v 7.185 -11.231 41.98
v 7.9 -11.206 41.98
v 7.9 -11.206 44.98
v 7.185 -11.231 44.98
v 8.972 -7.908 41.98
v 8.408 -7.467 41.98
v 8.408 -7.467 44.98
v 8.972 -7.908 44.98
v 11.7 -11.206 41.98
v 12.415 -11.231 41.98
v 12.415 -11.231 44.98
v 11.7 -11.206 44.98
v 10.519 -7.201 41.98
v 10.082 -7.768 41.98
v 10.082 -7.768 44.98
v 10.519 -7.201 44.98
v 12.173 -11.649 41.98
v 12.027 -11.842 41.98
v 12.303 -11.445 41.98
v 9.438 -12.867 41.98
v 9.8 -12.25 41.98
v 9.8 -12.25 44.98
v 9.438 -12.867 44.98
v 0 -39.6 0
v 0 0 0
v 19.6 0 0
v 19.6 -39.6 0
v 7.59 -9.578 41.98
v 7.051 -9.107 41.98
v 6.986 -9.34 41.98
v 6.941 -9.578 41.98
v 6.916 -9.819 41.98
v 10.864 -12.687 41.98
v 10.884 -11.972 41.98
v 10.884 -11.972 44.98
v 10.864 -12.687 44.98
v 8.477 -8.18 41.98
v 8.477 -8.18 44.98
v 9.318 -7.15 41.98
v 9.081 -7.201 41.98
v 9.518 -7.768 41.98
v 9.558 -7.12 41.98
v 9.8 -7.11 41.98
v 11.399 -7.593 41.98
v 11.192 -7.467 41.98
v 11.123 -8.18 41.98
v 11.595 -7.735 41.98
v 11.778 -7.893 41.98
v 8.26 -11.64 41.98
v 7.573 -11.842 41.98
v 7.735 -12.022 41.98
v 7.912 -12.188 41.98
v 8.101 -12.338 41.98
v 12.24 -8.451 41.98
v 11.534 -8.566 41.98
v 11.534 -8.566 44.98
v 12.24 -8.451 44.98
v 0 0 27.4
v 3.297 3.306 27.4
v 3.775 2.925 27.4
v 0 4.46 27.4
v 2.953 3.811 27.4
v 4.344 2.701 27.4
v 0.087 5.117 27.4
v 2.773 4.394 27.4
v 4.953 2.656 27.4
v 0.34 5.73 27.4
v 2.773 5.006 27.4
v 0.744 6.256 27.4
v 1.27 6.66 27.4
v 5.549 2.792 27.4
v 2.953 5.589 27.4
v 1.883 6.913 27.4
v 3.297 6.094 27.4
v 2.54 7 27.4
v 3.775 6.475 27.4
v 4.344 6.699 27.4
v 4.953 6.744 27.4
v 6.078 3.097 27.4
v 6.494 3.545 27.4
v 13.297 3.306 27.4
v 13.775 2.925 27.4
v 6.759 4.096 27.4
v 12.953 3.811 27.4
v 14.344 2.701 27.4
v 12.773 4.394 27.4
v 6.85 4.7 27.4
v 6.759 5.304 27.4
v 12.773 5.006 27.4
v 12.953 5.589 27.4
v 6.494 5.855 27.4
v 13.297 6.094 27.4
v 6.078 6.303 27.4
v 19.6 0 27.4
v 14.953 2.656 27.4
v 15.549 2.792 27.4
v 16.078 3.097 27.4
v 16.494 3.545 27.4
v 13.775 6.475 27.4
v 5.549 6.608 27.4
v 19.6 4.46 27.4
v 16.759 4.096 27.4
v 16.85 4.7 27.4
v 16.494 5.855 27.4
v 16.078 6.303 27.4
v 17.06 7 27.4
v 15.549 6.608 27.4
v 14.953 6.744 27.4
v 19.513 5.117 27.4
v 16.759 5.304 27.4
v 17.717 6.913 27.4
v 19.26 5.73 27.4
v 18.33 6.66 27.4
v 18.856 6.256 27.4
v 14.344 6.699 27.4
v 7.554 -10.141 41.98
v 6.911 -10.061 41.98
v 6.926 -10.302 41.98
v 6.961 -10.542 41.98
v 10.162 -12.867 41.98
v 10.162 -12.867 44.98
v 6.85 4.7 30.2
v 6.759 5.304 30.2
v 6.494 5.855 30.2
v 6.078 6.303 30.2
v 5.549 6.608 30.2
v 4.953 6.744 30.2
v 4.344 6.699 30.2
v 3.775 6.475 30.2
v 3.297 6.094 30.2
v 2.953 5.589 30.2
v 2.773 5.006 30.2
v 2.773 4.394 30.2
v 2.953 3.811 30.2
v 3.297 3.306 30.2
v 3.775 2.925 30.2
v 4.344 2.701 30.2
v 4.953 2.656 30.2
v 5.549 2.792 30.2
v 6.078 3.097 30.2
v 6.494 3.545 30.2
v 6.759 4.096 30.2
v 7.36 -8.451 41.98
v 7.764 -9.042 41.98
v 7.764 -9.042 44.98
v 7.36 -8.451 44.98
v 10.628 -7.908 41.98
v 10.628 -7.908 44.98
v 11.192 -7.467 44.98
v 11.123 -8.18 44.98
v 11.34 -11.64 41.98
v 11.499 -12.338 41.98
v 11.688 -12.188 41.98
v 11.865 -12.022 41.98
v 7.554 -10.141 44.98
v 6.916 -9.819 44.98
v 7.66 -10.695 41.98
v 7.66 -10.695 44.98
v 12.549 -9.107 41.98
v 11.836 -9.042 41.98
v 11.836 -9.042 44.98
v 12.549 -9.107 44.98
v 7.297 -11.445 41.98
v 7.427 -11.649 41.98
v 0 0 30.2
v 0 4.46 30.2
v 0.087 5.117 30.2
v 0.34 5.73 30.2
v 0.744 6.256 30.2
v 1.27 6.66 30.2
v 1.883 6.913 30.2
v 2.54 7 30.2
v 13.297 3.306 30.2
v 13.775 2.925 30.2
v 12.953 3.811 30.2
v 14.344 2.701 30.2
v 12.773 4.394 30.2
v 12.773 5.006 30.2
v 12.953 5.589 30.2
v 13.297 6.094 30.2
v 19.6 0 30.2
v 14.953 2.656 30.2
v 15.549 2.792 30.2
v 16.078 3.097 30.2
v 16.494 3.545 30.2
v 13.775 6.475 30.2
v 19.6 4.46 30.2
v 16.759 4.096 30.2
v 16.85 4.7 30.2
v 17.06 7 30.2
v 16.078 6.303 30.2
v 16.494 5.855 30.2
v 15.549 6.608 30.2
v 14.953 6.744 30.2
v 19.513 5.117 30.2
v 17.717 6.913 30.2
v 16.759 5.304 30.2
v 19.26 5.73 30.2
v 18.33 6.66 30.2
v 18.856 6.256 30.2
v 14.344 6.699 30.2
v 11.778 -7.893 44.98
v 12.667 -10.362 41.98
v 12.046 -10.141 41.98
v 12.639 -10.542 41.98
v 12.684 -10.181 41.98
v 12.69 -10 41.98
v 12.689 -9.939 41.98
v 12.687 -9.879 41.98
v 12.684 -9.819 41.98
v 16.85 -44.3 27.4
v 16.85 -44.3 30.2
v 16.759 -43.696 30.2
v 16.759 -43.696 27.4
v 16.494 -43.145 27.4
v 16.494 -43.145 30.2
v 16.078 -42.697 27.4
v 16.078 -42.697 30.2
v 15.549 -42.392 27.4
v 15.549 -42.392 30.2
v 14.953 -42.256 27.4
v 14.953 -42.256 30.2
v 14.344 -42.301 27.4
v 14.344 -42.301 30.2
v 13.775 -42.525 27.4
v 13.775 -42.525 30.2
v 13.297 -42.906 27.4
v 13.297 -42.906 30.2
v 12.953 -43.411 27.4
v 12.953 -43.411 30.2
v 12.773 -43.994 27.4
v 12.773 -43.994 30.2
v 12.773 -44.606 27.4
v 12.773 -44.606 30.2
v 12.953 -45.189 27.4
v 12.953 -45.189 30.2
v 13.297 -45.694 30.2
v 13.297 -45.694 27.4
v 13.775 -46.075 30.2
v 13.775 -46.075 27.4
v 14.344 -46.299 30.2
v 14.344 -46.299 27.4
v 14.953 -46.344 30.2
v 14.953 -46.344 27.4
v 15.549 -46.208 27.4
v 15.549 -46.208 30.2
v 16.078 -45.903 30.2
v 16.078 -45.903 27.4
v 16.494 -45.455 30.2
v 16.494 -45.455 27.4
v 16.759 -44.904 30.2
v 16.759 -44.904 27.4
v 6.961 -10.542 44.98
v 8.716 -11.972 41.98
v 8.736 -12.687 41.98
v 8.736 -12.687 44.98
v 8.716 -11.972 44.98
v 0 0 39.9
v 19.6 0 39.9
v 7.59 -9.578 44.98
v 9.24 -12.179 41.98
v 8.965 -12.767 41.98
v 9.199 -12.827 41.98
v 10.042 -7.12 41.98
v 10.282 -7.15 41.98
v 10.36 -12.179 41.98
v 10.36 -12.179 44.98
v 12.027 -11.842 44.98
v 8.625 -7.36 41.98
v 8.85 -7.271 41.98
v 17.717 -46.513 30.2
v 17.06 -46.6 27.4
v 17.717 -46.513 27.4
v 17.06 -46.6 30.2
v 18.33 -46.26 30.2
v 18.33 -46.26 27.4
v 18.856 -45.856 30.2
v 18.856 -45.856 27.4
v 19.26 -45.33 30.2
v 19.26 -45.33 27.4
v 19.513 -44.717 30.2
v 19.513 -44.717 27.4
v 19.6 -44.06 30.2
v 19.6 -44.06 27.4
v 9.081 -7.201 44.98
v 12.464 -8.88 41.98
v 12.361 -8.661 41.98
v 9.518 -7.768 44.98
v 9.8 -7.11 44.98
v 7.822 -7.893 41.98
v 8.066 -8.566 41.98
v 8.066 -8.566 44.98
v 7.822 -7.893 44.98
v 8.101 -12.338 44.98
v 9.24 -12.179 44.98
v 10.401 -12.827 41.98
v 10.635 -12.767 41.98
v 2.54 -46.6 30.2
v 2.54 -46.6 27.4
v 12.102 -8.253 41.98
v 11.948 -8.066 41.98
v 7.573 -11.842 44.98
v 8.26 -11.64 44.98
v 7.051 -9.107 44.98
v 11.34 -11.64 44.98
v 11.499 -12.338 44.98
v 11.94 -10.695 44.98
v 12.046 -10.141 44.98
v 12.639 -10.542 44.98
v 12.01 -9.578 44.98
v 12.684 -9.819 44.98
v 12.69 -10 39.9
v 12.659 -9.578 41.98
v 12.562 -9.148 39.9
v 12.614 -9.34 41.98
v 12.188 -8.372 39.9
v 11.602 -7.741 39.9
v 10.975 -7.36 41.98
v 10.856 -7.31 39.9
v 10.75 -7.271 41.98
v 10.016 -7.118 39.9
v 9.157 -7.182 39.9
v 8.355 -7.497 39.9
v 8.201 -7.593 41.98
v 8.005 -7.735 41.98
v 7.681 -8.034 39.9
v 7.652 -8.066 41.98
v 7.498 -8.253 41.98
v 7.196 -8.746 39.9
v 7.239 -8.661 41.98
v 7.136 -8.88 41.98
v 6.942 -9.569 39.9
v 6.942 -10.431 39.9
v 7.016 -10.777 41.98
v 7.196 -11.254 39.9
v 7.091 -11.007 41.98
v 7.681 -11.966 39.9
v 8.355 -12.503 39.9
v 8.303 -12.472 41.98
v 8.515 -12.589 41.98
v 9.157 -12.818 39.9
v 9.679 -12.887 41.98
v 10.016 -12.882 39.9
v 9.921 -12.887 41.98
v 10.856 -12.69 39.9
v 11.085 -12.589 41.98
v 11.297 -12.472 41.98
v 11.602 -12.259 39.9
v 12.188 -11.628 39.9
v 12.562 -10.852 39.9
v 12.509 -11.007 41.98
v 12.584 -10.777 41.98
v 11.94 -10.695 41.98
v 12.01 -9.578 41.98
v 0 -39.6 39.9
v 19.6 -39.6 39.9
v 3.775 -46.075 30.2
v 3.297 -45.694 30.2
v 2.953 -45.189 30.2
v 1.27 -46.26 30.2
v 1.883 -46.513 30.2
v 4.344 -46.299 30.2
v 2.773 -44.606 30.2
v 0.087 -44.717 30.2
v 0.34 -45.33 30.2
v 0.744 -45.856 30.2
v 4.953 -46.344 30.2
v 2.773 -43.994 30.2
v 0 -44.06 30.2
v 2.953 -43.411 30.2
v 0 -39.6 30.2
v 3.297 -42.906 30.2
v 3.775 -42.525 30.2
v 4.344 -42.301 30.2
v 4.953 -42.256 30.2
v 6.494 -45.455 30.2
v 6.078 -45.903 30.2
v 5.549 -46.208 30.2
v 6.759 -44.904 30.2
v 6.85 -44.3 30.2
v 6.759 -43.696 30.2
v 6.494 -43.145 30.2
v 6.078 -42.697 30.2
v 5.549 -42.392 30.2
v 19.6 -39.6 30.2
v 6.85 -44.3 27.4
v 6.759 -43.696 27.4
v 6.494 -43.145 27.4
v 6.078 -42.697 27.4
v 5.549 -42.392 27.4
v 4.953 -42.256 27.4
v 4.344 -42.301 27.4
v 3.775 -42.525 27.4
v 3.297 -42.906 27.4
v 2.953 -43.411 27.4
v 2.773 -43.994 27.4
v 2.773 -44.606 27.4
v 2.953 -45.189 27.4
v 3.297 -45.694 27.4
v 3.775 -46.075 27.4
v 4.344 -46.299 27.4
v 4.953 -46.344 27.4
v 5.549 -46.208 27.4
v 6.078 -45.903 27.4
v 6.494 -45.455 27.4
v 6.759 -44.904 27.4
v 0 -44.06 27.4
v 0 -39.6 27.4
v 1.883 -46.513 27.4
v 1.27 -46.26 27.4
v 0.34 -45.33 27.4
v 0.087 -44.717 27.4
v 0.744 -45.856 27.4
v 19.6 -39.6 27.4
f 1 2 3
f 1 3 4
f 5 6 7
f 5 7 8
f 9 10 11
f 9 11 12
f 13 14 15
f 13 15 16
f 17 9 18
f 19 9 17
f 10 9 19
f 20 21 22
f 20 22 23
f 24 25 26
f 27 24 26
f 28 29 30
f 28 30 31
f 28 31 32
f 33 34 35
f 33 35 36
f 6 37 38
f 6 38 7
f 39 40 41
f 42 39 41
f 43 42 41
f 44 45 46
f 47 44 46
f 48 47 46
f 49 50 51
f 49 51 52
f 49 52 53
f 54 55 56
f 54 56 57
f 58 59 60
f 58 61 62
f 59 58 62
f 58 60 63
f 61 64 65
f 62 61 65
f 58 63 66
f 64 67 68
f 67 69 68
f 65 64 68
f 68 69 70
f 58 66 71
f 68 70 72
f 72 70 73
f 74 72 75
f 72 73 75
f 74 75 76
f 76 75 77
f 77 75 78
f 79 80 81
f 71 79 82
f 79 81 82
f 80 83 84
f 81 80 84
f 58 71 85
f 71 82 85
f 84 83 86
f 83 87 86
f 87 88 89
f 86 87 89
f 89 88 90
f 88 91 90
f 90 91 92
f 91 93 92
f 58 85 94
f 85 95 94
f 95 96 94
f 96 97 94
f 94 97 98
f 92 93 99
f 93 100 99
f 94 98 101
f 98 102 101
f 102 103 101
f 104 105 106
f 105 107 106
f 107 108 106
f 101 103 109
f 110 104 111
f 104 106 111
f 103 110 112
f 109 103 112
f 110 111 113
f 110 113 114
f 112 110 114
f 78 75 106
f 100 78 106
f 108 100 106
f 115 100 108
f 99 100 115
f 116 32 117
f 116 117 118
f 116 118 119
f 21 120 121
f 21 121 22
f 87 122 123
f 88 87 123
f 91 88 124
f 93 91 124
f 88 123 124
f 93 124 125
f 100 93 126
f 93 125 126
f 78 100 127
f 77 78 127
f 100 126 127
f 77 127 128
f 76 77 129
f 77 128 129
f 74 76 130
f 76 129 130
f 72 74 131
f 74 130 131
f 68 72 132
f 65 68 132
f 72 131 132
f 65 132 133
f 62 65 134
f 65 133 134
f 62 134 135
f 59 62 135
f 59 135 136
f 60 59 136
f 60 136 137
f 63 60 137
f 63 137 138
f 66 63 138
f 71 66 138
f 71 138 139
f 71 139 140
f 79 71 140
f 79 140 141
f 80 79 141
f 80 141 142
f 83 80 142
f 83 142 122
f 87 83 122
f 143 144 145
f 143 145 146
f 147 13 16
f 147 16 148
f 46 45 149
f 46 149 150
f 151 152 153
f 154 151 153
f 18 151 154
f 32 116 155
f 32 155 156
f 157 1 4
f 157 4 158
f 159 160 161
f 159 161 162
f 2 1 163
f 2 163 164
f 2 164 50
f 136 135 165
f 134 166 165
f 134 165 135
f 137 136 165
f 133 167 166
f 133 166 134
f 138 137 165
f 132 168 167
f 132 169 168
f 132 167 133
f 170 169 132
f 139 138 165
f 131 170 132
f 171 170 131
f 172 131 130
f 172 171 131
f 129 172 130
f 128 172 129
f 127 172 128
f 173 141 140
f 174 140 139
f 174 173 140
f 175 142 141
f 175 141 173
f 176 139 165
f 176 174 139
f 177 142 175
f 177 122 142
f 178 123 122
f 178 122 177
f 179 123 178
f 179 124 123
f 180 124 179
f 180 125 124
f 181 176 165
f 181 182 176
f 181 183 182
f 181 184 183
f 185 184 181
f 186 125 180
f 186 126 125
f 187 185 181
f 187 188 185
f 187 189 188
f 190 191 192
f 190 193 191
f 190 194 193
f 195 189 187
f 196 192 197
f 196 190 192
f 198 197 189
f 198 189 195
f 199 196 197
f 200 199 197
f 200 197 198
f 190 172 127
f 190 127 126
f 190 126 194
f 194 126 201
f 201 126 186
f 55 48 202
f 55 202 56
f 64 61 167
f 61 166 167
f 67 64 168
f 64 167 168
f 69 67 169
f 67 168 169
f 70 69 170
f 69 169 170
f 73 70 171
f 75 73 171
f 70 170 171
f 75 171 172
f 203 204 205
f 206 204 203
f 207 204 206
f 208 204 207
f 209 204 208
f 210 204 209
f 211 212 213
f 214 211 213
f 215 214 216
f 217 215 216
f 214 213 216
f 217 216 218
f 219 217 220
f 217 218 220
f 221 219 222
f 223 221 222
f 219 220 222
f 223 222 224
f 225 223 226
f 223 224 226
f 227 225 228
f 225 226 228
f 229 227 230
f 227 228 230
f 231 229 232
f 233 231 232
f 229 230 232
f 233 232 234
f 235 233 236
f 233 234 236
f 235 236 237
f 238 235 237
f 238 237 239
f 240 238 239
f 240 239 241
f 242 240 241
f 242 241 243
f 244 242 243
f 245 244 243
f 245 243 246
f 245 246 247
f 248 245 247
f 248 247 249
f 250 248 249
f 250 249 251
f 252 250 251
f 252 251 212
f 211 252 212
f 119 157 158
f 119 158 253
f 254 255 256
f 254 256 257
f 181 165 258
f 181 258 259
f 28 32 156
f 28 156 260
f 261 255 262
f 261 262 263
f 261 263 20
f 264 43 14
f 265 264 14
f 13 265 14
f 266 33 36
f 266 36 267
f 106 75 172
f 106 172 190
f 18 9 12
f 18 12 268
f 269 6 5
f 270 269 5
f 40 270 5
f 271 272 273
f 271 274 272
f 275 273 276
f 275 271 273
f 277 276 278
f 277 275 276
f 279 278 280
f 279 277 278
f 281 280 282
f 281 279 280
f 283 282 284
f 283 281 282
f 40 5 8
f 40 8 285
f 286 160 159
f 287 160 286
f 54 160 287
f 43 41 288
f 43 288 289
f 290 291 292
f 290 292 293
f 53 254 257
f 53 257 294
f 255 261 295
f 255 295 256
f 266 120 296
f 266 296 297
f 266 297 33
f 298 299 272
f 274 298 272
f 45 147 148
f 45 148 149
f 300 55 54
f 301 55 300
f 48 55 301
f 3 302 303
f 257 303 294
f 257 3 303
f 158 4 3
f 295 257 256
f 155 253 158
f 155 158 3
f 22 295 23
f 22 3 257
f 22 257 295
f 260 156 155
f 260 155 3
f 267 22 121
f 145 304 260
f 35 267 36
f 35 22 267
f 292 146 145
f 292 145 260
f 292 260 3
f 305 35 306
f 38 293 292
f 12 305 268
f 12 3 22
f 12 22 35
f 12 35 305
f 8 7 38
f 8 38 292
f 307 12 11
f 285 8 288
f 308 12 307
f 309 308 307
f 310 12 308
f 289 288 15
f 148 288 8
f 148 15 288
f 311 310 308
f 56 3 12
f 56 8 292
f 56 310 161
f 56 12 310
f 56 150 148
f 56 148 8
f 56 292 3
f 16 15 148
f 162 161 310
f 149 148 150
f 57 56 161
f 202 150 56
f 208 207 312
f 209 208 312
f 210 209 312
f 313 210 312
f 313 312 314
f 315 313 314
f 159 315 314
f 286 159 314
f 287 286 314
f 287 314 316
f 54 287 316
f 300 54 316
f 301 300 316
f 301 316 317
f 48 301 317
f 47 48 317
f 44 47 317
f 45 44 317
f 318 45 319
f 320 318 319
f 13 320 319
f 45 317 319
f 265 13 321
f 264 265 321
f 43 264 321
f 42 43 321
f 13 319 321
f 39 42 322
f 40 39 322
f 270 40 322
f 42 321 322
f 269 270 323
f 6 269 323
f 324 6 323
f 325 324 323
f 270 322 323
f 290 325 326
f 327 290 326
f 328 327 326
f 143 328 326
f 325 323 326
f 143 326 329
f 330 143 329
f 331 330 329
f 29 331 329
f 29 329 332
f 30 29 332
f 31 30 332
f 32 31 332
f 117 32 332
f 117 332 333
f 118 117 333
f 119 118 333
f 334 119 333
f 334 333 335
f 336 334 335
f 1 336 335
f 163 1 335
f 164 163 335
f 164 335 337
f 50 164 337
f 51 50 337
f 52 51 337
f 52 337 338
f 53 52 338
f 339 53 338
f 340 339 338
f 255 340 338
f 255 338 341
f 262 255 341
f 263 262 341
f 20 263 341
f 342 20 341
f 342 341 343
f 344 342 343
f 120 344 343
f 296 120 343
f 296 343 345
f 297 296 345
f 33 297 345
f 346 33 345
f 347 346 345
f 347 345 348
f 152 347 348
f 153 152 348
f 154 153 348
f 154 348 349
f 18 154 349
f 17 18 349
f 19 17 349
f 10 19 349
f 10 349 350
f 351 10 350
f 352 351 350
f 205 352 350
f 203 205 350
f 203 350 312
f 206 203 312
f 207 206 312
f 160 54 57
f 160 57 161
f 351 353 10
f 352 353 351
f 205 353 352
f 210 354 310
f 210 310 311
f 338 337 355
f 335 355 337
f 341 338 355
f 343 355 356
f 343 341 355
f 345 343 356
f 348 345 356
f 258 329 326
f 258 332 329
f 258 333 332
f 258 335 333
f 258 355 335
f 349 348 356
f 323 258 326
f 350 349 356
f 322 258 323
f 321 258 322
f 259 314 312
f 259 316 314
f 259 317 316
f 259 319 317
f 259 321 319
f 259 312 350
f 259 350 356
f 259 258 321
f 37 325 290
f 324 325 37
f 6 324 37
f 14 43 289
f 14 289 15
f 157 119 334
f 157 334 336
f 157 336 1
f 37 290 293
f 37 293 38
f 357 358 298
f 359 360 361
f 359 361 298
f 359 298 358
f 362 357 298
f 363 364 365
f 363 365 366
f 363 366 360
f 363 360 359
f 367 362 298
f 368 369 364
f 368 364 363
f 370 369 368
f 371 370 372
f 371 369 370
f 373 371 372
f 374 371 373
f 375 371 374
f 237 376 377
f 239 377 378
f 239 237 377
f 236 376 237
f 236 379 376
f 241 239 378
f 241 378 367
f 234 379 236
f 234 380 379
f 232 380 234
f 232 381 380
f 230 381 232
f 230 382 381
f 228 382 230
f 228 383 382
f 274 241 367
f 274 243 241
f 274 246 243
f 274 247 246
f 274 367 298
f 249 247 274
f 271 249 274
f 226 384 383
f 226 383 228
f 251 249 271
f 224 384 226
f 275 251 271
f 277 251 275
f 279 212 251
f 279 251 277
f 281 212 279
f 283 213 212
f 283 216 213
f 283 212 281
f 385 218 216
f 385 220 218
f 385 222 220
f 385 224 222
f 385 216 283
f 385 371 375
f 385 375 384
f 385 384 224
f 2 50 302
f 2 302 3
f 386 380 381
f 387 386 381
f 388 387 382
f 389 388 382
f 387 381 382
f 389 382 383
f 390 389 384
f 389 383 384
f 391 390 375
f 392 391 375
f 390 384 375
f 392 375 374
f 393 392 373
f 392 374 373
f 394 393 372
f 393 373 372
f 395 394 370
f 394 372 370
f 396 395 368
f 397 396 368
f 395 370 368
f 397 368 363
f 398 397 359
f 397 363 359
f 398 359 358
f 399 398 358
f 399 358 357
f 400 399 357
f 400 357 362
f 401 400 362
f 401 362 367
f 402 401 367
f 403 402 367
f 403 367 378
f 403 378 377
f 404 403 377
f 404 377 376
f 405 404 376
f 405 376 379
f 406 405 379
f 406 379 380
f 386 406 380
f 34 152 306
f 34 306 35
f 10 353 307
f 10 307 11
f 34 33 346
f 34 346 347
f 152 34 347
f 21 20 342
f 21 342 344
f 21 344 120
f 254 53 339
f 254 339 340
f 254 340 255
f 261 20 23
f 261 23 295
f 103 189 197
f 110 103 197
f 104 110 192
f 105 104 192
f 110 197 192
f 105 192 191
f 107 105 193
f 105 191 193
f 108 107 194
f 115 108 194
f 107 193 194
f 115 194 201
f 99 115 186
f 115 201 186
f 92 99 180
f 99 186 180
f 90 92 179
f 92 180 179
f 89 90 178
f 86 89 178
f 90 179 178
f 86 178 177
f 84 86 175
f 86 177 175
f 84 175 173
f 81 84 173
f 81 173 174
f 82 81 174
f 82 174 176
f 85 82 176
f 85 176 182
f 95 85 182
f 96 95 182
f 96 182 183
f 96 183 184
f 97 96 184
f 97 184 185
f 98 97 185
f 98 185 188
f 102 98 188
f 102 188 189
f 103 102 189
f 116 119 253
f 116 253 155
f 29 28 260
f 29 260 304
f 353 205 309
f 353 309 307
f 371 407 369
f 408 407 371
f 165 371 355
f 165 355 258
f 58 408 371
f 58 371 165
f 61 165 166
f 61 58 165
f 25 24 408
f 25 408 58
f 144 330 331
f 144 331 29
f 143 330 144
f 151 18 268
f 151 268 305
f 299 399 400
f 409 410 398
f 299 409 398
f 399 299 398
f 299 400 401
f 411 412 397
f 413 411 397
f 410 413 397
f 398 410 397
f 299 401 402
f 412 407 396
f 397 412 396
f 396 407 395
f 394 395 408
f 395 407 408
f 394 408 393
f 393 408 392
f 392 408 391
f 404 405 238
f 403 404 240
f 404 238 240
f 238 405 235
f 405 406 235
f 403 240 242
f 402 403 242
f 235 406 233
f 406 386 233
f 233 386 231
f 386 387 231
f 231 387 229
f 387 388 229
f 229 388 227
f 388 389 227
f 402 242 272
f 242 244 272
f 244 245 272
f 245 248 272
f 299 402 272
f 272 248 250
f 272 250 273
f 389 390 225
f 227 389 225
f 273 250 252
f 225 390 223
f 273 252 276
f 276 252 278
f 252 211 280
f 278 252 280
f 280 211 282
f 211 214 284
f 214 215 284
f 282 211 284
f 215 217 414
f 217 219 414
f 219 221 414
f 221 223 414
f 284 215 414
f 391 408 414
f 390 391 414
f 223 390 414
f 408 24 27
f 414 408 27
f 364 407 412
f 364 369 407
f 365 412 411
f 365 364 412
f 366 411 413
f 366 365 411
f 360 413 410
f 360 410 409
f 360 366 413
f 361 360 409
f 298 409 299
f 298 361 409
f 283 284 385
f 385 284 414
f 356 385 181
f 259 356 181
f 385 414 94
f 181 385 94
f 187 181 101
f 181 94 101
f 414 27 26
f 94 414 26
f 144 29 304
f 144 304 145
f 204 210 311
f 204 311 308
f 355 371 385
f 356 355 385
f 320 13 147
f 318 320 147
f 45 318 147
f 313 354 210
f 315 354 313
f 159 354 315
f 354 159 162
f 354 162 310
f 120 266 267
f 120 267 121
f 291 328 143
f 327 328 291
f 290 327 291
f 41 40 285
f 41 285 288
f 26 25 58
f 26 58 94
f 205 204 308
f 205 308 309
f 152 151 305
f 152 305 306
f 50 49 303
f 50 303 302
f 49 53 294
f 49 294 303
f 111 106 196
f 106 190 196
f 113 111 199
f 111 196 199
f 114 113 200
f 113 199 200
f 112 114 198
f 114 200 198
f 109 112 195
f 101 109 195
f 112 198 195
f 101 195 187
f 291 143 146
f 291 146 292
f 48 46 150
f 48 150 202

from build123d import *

# Parameters (mm, degrees)
SKETCH1_W           = 19.6
SKETCH1_H           = 39.6
BOSS_EXTRUDE1_DEPTH = 39.9
SKETCH2_R           = 2.89
BOSS_EXTRUDE2_DEPTH = 5.08
SKETCH3_W           = 19.6
SKETCH3_H           = 53.6
BOSS_EXTRUDE3_DEPTH = 2.8
SKETCH4_R           = 2.05
CUT_EXTRUDE1_DEPTH  = 59.887689748
FILLET1_R           = 2.54
CUT_EXTRUDE3_START  = -3
CUT_EXTRUDE3_DEPTH  = 3


with BuildPart() as part:
    # Sketch1 → Boss-Extrude1 (new body)
    with BuildSketch(Plane.XY):
        with Locations((9.8, -19.8)):
            Rectangle(SKETCH1_W, SKETCH1_H)
    extrude(amount=BOSS_EXTRUDE1_DEPTH)

    # Sketch2 → Boss-Extrude2 (add)
    with BuildSketch(Plane.XY.offset(39.9)):
        with Locations((9.8, -10)):
            Circle(SKETCH2_R)
    extrude(amount=BOSS_EXTRUDE2_DEPTH)

    # Sketch3 → Boss-Extrude3 (add)
    with BuildSketch(Plane.XY.offset(27.400000064)):
        with Locations((9.8, -19.8)):
            Rectangle(SKETCH3_W, SKETCH3_H)
    extrude(amount=BOSS_EXTRUDE3_DEPTH)

    # Sketch4 → Cut-Extrude1 (cut, through all)
    with BuildSketch(Plane.XY.offset(30.200000064)):
        with Locations((4.8, 4.7)):
            Circle(SKETCH4_R)
        with Locations((14.8, 4.7)):
            Circle(SKETCH4_R)
        with Locations((4.8, -44.3)):
            Circle(SKETCH4_R)
        with Locations((14.8, -44.3)):
            Circle(SKETCH4_R)
    extrude(amount=-CUT_EXTRUDE1_DEPTH, mode=Mode.SUBTRACT)

    # Fillet1
    fillet1_edges = [part.edges().sort_by_distance(p)[0] for p in [
        (19.6, -46.6, 28.800000064),
        (0, 7, 28.800000064),
        (0, -46.6, 28.800000064),
        (19.6, 7, 28.800000064),
    ]]
    fillet(fillet1_edges, radius=FILLET1_R)

    # Sketch5 → Cut-Extrude3 (cut)
    with BuildSketch(Plane.XY.offset(44.98).offset(CUT_EXTRUDE3_START)):
        with BuildLine():
            ThreePointArc((10.518713774, -7.200794664), (10.162213045, -7.132788513), (9.8, -7.11))
            Line((9.8, -7.11), (10.081999776, -7.767741922))
            Line((10.081999776, -7.767741922), (10.518713774, -7.200794664))
        make_face()
        with BuildLine():
            Line((9.518000224, -7.767741922), (9.8, -7.11))
            ThreePointArc((9.8, -7.11), (9.437786955, -7.132788513), (9.081286226, -7.200794664))
            Line((9.081286226, -7.200794664), (9.518000224, -7.767741922))
        make_face()
        with BuildLine():
            Line((8.971719756, -7.908002907), (9.081286226, -7.200794664))
            ThreePointArc((9.081286226, -7.200794664), (8.736120043, -7.312945956), (8.407731882, -7.467473695))
            Line((8.407731882, -7.467473695), (8.971719756, -7.908002907))
        make_face()
        with BuildLine():
            Line((8.477483182, -8.179711763), (8.407731882, -7.467473695))
            ThreePointArc((8.407731882, -7.467473695), (8.101300621, -7.661940886), (7.821658864, -7.893280667))
            Line((7.821658864, -7.893280667), (8.477483182, -8.179711763))
        make_face()
        with BuildLine():
            Line((8.066345204, -8.565796023), (7.821658864, -7.893280667))
            ThreePointArc((7.821658864, -7.893280667), (7.573216728, -8.15784467), (7.359892295, -8.451460563))
            Line((7.359892295, -8.451460563), (8.066345204, -8.565796023))
        make_face()
        with BuildLine():
            Line((7.764139132, -9.041996594), (7.359892295, -8.451460563))
            ThreePointArc((7.359892295, -8.451460563), (7.185049818, -8.769497847), (7.051446668, -9.106940886))
            Line((7.051446668, -9.106940886), (7.764139132, -9.041996594))
        make_face()
        with BuildLine():
            Line((7.589853686, -9.578392042), (7.051446668, -9.106940886))
            ThreePointArc((7.051446668, -9.106940886), (6.961189845, -9.458468001), (6.915702755, -9.818535399))
            Line((6.915702755, -9.818535399), (7.589853686, -9.578392042))
        make_face()
        with BuildLine():
            Line((7.554439861, -10.141278669), (6.915702755, -9.818535399))
            ThreePointArc((6.915702755, -9.818535399), (6.915702755, -10.181464601), (6.961189845, -10.541531999))
            Line((6.961189845, -10.541531999), (7.554439861, -10.141278669))
        make_face()
        with BuildLine():
            Line((7.660122838, -10.695288237), (6.961189845, -10.541531999))
            ThreePointArc((6.961189845, -10.541531999), (7.051446668, -10.893059114), (7.185049818, -11.230502153))
            Line((7.185049818, -11.230502153), (7.660122838, -10.695288237))
        make_face()
        with BuildLine():
            ThreePointArc((11.778341136, -7.893280667), (11.498699379, -7.661940886), (11.192268118, -7.467473695))
            Line((11.192268118, -7.467473695), (11.122516818, -8.179711763))
            Line((11.122516818, -8.179711763), (11.778341136, -7.893280667))
        make_face()
        with BuildLine():
            ThreePointArc((11.192268118, -7.467473695), (10.863879957, -7.312945956), (10.518713774, -7.200794664))
            Line((10.518713774, -7.200794664), (10.628280244, -7.908002907))
            Line((10.628280244, -7.908002907), (11.192268118, -7.467473695))
        make_face()
        with BuildLine():
            ThreePointArc((12.240107705, -8.451460563), (12.026783272, -8.15784467), (11.778341136, -7.893280667))
            Line((11.778341136, -7.893280667), (11.533654796, -8.565796023))
            Line((11.533654796, -8.565796023), (12.240107705, -8.451460563))
        make_face()
        with BuildLine():
            ThreePointArc((12.548553332, -9.106940886), (12.414950182, -8.769497847), (12.240107705, -8.451460563))
            Line((12.240107705, -8.451460563), (11.835860868, -9.041996594))
            Line((11.835860868, -9.041996594), (12.548553332, -9.106940886))
        make_face()
        with BuildLine():
            ThreePointArc((12.684297245, -9.818535399), (12.638810155, -9.458468001), (12.548553332, -9.106940886))
            Line((12.548553332, -9.106940886), (12.010146314, -9.578392042))
            Line((12.010146314, -9.578392042), (12.684297245, -9.818535399))
        make_face()
        with BuildLine():
            ThreePointArc((12.69, -10), (12.688573959, -9.909222906), (12.684297245, -9.818535399))
            Line((12.684297245, -9.818535399), (12.045560139, -10.141278669))
            Line((12.045560139, -10.141278669), (12.638810155, -10.541531999))
            ThreePointArc((12.638810155, -10.541531999), (12.677174078, -10.271973025), (12.69, -10))
        make_face()
        with BuildLine():
            ThreePointArc((12.414950182, -11.230502153), (12.548553332, -10.893059114), (12.638810155, -10.541531999))
            Line((12.638810155, -10.541531999), (11.939877162, -10.695288237))
            Line((11.939877162, -10.695288237), (12.414950182, -11.230502153))
        make_face()
        with BuildLine():
            ThreePointArc((12.026783272, -11.84215533), (12.240107705, -11.548539437), (12.414950182, -11.230502153))
            Line((12.414950182, -11.230502153), (11.699737832, -11.205610289))
            Line((11.699737832, -11.205610289), (12.026783272, -11.84215533))
        make_face()
        with BuildLine():
            ThreePointArc((11.498699379, -12.338059114), (11.778341136, -12.106719333), (12.026783272, -11.84215533))
            Line((12.026783272, -11.84215533), (11.340230988, -11.640179412))
            Line((11.340230988, -11.640179412), (11.498699379, -12.338059114))
        make_face()
        with BuildLine():
            ThreePointArc((10.863879957, -12.687054044), (11.192268118, -12.532526305), (11.498699379, -12.338059114))
            Line((11.498699379, -12.338059114), (10.883945767, -11.97169003))
            Line((10.883945767, -11.97169003), (10.863879957, -12.687054044))
        make_face()
        with BuildLine():
            ThreePointArc((10.162213045, -12.867211487), (10.518713774, -12.799205336), (10.863879957, -12.687054044))
            Line((10.863879957, -12.687054044), (10.359552246, -12.179312113))
            Line((10.359552246, -12.179312113), (10.162213045, -12.867211487))
        make_face()
        with BuildLine():
            Line((9.8, -12.25), (9.437786955, -12.867211487))
            ThreePointArc((9.437786955, -12.867211487), (9.8, -12.89), (10.162213045, -12.867211487))
            Line((10.162213045, -12.867211487), (9.8, -12.25))
        make_face()
        with BuildLine():
            Line((9.240447754, -12.179312113), (8.736120043, -12.687054044))
            ThreePointArc((8.736120043, -12.687054044), (9.081286226, -12.799205336), (9.437786955, -12.867211487))
            Line((9.437786955, -12.867211487), (9.240447754, -12.179312113))
        make_face()
        with BuildLine():
            Line((8.716054233, -11.97169003), (8.101300621, -12.338059114))
            ThreePointArc((8.101300621, -12.338059114), (8.407731882, -12.532526305), (8.736120043, -12.687054044))
            Line((8.736120043, -12.687054044), (8.716054233, -11.97169003))
        make_face()
        with BuildLine():
            Line((8.259769012, -11.640179412), (7.573216728, -11.84215533))
            ThreePointArc((7.573216728, -11.84215533), (7.821658864, -12.106719333), (8.101300621, -12.338059114))
            Line((8.101300621, -12.338059114), (8.259769012, -11.640179412))
        make_face()
        with BuildLine():
            Line((7.900262168, -11.205610289), (7.185049818, -11.230502153))
            ThreePointArc((7.185049818, -11.230502153), (7.359892295, -11.548539437), (7.573216728, -11.84215533))
            Line((7.573216728, -11.84215533), (7.900262168, -11.205610289))
        make_face()
    extrude(amount=CUT_EXTRUDE3_DEPTH, mode=Mode.SUBTRACT)


solid = part.part
